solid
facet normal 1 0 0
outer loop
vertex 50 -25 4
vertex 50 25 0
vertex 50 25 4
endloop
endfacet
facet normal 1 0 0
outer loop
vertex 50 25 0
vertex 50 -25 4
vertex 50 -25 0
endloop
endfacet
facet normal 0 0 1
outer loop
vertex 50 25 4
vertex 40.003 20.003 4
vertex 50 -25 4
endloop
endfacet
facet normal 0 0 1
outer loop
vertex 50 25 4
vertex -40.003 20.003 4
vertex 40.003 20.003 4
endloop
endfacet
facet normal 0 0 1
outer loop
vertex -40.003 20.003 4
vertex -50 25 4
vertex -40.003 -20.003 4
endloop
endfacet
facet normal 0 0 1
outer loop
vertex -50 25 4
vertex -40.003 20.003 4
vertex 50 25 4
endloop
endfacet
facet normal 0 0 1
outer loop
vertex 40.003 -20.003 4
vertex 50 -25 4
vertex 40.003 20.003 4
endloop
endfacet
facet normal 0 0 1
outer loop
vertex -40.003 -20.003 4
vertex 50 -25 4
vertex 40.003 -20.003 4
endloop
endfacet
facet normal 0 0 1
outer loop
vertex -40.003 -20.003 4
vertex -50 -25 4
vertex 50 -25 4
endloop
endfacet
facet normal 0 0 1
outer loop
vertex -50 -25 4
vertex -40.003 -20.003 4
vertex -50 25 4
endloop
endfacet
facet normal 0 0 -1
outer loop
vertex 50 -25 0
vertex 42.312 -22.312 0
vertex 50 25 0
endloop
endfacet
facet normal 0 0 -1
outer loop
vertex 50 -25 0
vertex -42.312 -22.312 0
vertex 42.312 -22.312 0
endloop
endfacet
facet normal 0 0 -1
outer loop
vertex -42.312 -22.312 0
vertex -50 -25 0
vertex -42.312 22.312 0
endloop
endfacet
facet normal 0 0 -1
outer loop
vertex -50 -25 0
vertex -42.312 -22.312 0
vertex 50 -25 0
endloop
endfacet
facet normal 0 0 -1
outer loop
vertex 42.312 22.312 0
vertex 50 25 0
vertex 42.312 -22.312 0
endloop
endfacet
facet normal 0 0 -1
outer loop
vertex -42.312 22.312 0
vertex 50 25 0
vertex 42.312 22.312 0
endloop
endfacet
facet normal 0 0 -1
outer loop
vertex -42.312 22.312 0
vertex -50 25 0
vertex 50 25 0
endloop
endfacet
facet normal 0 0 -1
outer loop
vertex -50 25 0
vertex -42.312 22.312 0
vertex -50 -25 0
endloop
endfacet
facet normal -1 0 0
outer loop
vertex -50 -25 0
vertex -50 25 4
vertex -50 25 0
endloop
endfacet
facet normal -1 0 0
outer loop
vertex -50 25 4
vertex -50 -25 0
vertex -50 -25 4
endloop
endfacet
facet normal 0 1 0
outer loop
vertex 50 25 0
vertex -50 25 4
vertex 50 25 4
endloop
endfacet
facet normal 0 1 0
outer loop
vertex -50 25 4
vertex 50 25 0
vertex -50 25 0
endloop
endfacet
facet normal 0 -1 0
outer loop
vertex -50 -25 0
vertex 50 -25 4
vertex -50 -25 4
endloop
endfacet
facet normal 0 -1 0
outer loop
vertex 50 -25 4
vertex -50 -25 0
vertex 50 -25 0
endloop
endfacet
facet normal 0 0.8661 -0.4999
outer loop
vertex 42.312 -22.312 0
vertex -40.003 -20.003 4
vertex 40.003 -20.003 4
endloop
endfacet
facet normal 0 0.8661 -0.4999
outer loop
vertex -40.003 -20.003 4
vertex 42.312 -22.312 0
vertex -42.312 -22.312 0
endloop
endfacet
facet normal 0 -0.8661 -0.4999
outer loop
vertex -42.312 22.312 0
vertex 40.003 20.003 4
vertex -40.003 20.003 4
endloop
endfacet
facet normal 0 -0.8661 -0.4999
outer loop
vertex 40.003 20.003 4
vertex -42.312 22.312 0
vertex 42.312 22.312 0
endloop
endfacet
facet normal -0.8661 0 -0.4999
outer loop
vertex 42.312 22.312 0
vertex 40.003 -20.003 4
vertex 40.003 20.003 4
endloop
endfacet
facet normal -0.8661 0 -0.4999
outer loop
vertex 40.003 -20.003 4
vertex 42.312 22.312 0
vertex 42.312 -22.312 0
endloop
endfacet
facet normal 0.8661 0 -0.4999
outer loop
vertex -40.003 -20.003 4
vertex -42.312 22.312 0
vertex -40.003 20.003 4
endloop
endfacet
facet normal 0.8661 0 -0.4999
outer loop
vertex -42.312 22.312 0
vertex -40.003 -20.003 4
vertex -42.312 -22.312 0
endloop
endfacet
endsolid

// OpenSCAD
// Draw a window in a panel with an angled opening.
// The passed size is the back/inside opening.
// The front of the hole will be grown according to the
// trig calculation and the thickness.
// A suggested thickness is 3.5-4mm

// Place this in a difference() block with other holes in the 
// panel.
// Translate as needed.  Include a small -z to clean up the hole
// in the rendering.
module Bezel(size)
{
    
    bx=size.x;  // Size of the cutout
    by=size.y;
    bz=size.z; // Thk at bezel
    bang=60;  // Angle at the bezel
    be=bz/tan(bang);

    
    
    bp=[[-bx/2-be,-by/2-be,0],[-bx/2-be,by/2+be,0],
        [bx/2+be,by/2+be,0],[bx/2+be,-by/2-be,0],
        [-bx/2,-by/2,bz],[-bx/2,by/2,bz],
        [bx/2,by/2,bz],[bx/2,-by/2,bz]];
    
    bf=[[3,2,1,0],[4,5,6,7],[0,4,7,3],[5,1,2,6],[0,1,5,4],[3,7,6,2]];   
    
    
    polyhedron(bp,bf,3);

}

module BezelTest()
{
    // the opening should be slightly thicker and lower
    // than the surrounding panel for the display.
    panel=[100,50,4];
    opening=[80,40,4.01];
    
    difference()
    {
        translate([0,0, panel.z/2])
            cube(panel,center=true);
        translate([0,0,-.005])
            Bezel(opening);
    }
}

BezelTest();
